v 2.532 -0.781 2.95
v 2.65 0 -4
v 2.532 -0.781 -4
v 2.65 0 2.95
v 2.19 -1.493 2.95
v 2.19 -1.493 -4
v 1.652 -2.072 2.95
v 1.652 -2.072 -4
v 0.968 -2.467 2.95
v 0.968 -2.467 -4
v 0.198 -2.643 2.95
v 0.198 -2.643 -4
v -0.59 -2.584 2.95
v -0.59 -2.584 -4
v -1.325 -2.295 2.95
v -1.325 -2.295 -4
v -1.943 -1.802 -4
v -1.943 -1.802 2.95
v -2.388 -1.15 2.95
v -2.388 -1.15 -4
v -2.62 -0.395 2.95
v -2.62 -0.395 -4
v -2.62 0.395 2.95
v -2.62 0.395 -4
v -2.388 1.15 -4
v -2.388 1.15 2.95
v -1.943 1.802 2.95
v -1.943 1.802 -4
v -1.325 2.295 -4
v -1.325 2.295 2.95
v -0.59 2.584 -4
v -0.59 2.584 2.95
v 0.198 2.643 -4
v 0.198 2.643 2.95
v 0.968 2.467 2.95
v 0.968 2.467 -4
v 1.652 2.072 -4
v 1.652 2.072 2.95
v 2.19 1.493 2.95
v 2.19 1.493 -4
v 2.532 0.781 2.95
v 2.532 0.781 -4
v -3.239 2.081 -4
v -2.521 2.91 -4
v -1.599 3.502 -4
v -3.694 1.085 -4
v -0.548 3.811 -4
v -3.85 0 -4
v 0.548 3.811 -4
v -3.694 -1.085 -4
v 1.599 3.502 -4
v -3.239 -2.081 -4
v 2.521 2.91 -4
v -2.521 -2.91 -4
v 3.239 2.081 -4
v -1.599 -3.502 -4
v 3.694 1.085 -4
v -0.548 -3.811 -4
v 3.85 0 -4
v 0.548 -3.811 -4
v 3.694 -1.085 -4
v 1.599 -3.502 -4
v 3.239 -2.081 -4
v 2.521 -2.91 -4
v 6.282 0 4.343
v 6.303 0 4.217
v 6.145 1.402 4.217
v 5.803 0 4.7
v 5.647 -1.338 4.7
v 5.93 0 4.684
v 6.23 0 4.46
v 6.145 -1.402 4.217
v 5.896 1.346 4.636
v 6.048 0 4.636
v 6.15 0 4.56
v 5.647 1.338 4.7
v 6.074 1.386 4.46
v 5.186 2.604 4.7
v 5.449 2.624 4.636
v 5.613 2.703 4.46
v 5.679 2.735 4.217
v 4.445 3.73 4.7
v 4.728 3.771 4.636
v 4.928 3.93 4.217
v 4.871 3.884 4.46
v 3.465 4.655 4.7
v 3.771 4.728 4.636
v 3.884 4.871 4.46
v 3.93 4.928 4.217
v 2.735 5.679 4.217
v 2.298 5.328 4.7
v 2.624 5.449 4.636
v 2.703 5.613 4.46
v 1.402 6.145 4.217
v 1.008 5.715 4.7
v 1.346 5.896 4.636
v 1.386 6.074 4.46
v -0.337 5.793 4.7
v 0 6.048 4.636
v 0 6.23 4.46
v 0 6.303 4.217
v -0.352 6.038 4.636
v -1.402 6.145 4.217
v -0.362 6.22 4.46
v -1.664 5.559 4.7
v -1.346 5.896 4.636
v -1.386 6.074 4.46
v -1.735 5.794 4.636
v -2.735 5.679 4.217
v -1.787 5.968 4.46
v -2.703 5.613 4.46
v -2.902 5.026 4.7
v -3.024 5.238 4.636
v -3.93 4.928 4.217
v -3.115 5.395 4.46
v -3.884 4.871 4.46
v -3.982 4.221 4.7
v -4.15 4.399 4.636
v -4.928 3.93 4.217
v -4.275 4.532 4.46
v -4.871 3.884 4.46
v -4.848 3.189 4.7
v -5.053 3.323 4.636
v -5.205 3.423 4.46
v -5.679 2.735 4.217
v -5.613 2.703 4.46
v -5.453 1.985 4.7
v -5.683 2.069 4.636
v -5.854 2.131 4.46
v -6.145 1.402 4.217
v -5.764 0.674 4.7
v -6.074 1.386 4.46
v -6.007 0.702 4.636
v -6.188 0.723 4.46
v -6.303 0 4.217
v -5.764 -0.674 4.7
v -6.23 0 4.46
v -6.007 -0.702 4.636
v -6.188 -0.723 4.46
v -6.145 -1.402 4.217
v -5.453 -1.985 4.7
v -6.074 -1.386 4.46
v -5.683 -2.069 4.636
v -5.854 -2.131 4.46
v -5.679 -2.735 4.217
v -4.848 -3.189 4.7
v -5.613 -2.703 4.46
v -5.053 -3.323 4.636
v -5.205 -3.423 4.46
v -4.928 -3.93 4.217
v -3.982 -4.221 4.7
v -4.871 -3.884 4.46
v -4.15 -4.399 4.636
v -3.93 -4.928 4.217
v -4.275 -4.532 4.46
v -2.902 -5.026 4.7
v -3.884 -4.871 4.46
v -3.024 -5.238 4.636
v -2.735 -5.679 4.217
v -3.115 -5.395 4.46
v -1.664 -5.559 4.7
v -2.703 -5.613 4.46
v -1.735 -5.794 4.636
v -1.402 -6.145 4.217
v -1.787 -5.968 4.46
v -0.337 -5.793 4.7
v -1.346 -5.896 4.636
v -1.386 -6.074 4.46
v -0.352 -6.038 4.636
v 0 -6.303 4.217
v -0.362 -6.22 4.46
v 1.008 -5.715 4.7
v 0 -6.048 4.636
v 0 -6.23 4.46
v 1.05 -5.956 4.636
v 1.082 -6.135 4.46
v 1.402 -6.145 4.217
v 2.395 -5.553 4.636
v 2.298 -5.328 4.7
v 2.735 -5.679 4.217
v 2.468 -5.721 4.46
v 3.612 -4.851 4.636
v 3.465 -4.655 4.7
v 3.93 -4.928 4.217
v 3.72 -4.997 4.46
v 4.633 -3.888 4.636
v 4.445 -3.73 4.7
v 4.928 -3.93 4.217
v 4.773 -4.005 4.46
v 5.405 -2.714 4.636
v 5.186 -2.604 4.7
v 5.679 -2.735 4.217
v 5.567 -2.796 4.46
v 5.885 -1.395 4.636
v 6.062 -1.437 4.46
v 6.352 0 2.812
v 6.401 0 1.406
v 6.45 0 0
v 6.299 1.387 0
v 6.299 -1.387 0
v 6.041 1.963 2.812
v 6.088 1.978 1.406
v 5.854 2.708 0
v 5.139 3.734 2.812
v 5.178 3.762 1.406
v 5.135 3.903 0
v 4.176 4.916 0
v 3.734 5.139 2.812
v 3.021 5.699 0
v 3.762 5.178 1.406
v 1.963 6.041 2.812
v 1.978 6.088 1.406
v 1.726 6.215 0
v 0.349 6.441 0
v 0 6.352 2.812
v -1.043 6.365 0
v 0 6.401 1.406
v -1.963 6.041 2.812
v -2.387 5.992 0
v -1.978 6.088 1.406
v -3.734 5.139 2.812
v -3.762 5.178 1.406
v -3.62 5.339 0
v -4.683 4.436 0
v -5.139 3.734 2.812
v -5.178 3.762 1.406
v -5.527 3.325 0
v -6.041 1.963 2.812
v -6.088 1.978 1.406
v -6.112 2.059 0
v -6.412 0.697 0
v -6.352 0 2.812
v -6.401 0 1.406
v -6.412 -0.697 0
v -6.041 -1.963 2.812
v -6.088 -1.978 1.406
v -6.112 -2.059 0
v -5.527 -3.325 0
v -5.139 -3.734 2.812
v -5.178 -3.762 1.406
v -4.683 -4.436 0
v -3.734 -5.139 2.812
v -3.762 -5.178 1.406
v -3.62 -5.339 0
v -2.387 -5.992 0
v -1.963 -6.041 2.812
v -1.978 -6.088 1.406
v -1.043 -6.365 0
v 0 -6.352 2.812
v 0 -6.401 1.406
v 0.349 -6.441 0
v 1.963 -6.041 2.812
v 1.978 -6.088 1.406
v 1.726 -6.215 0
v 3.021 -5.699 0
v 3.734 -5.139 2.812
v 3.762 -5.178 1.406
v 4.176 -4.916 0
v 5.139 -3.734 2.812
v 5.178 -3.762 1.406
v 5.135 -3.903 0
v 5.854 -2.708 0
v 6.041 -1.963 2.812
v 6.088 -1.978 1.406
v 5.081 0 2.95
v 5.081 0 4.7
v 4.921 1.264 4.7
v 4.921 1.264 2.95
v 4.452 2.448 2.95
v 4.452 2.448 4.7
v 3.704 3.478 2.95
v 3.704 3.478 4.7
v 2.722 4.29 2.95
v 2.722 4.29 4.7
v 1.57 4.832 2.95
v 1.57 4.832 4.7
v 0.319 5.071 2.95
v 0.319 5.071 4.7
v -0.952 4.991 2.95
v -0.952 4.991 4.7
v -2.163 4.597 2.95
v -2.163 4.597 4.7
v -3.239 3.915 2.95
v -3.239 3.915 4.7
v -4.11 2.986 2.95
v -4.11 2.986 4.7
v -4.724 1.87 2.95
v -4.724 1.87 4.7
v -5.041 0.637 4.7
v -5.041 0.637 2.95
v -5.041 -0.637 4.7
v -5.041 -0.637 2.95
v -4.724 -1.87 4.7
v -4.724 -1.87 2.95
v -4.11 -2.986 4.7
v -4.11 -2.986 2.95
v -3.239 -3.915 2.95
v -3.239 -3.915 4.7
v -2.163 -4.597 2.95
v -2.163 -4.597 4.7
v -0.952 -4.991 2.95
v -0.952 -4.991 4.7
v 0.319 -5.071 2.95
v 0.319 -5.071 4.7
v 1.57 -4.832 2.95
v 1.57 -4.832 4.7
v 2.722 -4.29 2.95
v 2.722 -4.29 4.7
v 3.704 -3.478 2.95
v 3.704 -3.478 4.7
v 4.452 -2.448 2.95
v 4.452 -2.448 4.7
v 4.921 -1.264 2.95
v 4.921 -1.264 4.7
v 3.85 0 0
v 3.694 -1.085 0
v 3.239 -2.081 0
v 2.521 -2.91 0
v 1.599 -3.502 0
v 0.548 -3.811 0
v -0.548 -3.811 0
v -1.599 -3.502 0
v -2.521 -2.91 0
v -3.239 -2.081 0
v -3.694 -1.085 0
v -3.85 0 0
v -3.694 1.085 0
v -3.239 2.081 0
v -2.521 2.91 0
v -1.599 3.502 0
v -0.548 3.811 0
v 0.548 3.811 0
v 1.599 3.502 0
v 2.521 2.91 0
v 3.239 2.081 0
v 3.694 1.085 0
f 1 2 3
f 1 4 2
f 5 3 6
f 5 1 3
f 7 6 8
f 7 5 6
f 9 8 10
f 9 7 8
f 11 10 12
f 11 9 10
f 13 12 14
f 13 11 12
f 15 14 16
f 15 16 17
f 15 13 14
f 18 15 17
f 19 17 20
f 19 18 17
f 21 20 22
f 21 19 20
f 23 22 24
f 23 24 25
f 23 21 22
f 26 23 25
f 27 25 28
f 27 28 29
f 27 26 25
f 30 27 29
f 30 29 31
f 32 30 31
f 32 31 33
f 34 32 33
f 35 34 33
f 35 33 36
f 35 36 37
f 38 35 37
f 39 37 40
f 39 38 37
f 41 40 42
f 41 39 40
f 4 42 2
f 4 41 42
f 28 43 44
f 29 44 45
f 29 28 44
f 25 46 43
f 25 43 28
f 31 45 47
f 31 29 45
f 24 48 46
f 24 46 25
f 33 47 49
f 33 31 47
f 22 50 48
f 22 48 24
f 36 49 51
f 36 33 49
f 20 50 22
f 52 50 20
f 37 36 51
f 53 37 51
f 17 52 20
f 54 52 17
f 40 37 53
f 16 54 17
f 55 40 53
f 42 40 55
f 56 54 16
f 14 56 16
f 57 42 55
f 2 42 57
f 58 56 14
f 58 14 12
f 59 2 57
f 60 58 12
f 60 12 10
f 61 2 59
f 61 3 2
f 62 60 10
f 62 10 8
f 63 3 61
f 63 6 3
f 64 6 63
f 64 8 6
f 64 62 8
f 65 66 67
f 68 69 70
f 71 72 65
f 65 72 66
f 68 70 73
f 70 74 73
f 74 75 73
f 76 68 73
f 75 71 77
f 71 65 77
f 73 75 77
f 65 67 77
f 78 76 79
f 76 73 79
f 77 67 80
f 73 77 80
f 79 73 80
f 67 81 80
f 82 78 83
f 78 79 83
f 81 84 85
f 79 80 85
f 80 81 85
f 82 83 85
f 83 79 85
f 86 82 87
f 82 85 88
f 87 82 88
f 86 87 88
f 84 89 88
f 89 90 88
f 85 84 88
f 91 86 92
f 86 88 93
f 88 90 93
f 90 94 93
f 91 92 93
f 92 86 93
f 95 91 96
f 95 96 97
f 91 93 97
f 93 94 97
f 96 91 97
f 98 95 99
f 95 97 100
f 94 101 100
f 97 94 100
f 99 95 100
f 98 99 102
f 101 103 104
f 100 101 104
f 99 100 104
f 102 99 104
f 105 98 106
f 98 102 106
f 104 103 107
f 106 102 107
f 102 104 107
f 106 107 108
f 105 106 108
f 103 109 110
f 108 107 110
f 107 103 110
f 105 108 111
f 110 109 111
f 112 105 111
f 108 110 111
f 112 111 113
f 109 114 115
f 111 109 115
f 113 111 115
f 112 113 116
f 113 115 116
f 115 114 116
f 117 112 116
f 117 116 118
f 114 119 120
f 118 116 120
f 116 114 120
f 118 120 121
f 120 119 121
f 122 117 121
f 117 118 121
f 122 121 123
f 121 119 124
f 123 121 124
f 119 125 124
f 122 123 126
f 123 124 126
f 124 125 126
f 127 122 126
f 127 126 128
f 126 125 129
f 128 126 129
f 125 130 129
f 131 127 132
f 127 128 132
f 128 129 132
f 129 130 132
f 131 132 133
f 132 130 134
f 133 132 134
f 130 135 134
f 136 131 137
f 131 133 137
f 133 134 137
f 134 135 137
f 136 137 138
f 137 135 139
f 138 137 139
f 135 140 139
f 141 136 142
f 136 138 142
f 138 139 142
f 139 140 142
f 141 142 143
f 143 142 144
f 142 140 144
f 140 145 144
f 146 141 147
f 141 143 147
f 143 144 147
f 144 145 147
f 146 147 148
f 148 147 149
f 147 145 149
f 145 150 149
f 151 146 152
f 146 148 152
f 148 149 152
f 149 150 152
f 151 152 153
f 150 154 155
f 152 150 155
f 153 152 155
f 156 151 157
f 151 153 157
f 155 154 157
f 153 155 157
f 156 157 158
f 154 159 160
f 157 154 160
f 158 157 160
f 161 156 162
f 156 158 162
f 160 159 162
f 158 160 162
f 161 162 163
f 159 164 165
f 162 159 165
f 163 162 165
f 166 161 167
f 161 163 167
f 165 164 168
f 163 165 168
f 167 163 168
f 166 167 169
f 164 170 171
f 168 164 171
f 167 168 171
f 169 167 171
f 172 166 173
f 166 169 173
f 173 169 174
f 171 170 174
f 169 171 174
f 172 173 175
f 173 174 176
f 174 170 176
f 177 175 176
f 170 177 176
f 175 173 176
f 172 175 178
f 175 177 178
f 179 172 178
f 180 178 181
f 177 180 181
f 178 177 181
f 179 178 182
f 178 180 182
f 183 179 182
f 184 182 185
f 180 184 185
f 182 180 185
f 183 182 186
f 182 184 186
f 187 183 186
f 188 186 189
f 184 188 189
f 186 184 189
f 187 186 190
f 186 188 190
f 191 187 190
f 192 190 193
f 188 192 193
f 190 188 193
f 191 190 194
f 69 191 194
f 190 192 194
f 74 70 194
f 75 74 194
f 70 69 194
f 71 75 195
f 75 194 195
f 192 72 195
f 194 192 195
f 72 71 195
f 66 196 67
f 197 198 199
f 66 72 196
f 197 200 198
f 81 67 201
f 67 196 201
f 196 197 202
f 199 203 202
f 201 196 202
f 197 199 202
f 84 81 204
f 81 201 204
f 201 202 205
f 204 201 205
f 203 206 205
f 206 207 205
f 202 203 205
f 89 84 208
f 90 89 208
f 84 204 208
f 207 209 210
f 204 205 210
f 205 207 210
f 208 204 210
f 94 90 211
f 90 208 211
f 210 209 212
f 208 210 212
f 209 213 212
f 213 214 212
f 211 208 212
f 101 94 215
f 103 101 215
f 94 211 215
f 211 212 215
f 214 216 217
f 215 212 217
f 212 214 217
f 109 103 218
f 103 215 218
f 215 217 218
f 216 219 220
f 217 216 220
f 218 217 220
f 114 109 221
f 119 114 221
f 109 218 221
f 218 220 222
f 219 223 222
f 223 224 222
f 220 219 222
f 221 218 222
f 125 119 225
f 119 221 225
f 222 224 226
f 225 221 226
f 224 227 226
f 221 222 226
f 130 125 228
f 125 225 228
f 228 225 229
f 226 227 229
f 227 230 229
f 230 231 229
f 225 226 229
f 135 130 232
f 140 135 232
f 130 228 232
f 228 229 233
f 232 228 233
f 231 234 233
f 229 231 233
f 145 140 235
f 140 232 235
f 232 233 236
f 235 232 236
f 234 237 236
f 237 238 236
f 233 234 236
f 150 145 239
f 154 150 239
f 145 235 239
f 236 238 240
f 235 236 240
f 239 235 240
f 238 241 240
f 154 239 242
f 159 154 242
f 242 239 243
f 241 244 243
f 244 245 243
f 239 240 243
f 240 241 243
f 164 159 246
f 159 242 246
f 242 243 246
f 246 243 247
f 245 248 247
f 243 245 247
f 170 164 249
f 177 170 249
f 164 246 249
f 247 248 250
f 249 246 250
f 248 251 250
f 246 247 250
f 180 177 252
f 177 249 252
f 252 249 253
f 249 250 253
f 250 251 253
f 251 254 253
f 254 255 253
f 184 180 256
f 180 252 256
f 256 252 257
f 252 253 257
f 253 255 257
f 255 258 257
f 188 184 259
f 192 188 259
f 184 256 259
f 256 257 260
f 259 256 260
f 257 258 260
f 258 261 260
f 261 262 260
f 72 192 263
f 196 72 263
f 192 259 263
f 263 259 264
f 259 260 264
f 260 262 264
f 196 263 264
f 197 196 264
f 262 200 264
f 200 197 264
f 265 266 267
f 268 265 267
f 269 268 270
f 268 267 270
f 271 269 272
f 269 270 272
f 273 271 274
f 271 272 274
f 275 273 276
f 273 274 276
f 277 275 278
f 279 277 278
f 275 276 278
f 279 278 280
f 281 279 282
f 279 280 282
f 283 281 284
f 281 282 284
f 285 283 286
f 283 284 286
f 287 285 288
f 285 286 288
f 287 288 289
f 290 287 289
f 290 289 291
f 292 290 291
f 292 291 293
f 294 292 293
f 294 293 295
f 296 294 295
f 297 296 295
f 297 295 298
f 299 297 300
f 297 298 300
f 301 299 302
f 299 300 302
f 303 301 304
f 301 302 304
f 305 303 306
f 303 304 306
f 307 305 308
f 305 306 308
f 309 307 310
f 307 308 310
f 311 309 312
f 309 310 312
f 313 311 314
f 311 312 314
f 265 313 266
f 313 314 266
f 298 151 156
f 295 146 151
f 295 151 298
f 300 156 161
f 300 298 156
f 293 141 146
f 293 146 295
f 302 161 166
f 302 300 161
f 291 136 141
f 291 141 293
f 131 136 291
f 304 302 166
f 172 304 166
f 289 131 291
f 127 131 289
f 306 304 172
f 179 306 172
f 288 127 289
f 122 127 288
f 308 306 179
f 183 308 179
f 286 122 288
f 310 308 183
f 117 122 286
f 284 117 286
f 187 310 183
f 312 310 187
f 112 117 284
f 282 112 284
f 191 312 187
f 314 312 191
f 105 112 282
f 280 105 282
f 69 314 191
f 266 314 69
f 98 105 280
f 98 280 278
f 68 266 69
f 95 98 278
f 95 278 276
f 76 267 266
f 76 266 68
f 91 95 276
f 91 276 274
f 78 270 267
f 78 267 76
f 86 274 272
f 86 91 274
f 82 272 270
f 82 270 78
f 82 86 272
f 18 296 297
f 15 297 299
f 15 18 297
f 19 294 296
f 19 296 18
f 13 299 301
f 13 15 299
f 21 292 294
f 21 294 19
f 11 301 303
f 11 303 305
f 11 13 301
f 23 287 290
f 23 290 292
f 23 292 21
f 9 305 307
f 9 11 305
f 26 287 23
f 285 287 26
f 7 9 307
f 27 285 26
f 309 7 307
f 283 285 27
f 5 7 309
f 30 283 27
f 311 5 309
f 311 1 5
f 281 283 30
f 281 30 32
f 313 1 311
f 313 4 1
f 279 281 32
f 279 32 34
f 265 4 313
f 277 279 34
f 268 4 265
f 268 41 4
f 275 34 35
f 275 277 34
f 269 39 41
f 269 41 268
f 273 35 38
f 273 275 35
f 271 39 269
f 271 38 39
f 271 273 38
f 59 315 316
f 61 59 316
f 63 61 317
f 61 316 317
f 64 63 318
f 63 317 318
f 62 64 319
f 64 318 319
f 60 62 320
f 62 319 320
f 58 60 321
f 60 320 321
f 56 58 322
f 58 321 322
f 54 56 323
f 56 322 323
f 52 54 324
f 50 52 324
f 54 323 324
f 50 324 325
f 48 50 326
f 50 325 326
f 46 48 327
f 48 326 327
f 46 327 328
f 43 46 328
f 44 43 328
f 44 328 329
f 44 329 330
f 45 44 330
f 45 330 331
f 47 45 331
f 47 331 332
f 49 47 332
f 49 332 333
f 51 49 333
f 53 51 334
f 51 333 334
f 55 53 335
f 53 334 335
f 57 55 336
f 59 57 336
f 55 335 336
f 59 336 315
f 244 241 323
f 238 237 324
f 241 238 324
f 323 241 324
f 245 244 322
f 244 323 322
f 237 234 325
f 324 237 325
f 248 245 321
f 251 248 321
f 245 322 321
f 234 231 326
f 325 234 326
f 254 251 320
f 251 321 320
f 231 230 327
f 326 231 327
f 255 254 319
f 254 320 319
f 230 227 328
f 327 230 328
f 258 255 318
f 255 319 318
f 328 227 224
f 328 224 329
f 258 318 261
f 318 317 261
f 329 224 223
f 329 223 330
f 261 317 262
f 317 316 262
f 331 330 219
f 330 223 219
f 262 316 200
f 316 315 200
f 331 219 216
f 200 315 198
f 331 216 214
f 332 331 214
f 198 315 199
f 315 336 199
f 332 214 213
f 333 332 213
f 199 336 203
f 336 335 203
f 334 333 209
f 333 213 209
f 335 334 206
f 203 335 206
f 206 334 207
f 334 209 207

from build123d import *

# Parameters (mm, degrees)
ESQUISSE1_R             = 6.45
ESQUISSE1_R_2           = 5.15
BOSS_EXTRU_1_DEPTH      = 4.7
BOSS_EXTRU_1_DRAFT      = 2
ESQUISSE2_R             = 6.285872383
ESQUISSE2_R_2           = 2.65
BOSS_EXTRU_2_DEPTH      = 4.7
CONG_1_R                = 0.5
ESQUISSE4_R             = 5.080745256
ENL_V_MAT_EXTRU_1_DEPTH = 1.75
ESQUISSE3_R             = 3.85
ESQUISSE3_R_2           = 2.65
BOSS_EXTRU_8_DEPTH      = 4


with BuildPart() as part:
    # Esquisse1 → Boss.-Extru.1 (with draft: the straight prism first)
    with BuildSketch(Plane.XY):
        Circle(ESQUISSE1_R)
        Circle(ESQUISSE1_R_2, mode=Mode.SUBTRACT)
    extrude(amount=BOSS_EXTRU_1_DEPTH)
    # Boss.-Extru.1: the draft: its side faces are tilted about the plane it starts from
    boss_extru_1_sides = [part.faces().sort_by_distance(p)[0] for p in [
        (-6.45, 0, 2.35),
        (-5.15, 0, 2.35),
    ]]
    draft(boss_extru_1_sides, Plane.XY, BOSS_EXTRU_1_DRAFT)

    # Esquisse2 → Boss.-Extru.2 (add)
    with BuildSketch(Plane.XY.offset(4.7)):
        Circle(ESQUISSE2_R)
        Circle(ESQUISSE2_R_2, mode=Mode.SUBTRACT)
    extrude(amount=-BOSS_EXTRU_2_DEPTH)

    # Congé1
    cong_1_edges = [part.edges().sort_by_distance(p)[0] for p in [
        (-6.285872383, 0, 4.7),
    ]]
    fillet(cong_1_edges, radius=CONG_1_R)

    # Esquisse4 → Enlèv. mat.-Extru.1 (cut)
    with BuildSketch(Plane.XY.offset(4.7)):
        Circle(ESQUISSE4_R)
    extrude(amount=-ENL_V_MAT_EXTRU_1_DEPTH, mode=Mode.SUBTRACT)

    # Esquisse3 → Boss.-Extru.8 (add)
    with BuildSketch(Plane(origin=(0, 0, 0), x_dir=(-1, 0, 0), z_dir=(0, 0, -1))):
        with Locations(Location((0, 0, 0), (0, 0, 180))):
            Circle(ESQUISSE3_R)
        with Locations(Location((0, 0, 0), (0, 0, 180))):
            Circle(ESQUISSE3_R_2, mode=Mode.SUBTRACT)
    extrude(amount=BOSS_EXTRU_8_DEPTH)


solid = part.part
